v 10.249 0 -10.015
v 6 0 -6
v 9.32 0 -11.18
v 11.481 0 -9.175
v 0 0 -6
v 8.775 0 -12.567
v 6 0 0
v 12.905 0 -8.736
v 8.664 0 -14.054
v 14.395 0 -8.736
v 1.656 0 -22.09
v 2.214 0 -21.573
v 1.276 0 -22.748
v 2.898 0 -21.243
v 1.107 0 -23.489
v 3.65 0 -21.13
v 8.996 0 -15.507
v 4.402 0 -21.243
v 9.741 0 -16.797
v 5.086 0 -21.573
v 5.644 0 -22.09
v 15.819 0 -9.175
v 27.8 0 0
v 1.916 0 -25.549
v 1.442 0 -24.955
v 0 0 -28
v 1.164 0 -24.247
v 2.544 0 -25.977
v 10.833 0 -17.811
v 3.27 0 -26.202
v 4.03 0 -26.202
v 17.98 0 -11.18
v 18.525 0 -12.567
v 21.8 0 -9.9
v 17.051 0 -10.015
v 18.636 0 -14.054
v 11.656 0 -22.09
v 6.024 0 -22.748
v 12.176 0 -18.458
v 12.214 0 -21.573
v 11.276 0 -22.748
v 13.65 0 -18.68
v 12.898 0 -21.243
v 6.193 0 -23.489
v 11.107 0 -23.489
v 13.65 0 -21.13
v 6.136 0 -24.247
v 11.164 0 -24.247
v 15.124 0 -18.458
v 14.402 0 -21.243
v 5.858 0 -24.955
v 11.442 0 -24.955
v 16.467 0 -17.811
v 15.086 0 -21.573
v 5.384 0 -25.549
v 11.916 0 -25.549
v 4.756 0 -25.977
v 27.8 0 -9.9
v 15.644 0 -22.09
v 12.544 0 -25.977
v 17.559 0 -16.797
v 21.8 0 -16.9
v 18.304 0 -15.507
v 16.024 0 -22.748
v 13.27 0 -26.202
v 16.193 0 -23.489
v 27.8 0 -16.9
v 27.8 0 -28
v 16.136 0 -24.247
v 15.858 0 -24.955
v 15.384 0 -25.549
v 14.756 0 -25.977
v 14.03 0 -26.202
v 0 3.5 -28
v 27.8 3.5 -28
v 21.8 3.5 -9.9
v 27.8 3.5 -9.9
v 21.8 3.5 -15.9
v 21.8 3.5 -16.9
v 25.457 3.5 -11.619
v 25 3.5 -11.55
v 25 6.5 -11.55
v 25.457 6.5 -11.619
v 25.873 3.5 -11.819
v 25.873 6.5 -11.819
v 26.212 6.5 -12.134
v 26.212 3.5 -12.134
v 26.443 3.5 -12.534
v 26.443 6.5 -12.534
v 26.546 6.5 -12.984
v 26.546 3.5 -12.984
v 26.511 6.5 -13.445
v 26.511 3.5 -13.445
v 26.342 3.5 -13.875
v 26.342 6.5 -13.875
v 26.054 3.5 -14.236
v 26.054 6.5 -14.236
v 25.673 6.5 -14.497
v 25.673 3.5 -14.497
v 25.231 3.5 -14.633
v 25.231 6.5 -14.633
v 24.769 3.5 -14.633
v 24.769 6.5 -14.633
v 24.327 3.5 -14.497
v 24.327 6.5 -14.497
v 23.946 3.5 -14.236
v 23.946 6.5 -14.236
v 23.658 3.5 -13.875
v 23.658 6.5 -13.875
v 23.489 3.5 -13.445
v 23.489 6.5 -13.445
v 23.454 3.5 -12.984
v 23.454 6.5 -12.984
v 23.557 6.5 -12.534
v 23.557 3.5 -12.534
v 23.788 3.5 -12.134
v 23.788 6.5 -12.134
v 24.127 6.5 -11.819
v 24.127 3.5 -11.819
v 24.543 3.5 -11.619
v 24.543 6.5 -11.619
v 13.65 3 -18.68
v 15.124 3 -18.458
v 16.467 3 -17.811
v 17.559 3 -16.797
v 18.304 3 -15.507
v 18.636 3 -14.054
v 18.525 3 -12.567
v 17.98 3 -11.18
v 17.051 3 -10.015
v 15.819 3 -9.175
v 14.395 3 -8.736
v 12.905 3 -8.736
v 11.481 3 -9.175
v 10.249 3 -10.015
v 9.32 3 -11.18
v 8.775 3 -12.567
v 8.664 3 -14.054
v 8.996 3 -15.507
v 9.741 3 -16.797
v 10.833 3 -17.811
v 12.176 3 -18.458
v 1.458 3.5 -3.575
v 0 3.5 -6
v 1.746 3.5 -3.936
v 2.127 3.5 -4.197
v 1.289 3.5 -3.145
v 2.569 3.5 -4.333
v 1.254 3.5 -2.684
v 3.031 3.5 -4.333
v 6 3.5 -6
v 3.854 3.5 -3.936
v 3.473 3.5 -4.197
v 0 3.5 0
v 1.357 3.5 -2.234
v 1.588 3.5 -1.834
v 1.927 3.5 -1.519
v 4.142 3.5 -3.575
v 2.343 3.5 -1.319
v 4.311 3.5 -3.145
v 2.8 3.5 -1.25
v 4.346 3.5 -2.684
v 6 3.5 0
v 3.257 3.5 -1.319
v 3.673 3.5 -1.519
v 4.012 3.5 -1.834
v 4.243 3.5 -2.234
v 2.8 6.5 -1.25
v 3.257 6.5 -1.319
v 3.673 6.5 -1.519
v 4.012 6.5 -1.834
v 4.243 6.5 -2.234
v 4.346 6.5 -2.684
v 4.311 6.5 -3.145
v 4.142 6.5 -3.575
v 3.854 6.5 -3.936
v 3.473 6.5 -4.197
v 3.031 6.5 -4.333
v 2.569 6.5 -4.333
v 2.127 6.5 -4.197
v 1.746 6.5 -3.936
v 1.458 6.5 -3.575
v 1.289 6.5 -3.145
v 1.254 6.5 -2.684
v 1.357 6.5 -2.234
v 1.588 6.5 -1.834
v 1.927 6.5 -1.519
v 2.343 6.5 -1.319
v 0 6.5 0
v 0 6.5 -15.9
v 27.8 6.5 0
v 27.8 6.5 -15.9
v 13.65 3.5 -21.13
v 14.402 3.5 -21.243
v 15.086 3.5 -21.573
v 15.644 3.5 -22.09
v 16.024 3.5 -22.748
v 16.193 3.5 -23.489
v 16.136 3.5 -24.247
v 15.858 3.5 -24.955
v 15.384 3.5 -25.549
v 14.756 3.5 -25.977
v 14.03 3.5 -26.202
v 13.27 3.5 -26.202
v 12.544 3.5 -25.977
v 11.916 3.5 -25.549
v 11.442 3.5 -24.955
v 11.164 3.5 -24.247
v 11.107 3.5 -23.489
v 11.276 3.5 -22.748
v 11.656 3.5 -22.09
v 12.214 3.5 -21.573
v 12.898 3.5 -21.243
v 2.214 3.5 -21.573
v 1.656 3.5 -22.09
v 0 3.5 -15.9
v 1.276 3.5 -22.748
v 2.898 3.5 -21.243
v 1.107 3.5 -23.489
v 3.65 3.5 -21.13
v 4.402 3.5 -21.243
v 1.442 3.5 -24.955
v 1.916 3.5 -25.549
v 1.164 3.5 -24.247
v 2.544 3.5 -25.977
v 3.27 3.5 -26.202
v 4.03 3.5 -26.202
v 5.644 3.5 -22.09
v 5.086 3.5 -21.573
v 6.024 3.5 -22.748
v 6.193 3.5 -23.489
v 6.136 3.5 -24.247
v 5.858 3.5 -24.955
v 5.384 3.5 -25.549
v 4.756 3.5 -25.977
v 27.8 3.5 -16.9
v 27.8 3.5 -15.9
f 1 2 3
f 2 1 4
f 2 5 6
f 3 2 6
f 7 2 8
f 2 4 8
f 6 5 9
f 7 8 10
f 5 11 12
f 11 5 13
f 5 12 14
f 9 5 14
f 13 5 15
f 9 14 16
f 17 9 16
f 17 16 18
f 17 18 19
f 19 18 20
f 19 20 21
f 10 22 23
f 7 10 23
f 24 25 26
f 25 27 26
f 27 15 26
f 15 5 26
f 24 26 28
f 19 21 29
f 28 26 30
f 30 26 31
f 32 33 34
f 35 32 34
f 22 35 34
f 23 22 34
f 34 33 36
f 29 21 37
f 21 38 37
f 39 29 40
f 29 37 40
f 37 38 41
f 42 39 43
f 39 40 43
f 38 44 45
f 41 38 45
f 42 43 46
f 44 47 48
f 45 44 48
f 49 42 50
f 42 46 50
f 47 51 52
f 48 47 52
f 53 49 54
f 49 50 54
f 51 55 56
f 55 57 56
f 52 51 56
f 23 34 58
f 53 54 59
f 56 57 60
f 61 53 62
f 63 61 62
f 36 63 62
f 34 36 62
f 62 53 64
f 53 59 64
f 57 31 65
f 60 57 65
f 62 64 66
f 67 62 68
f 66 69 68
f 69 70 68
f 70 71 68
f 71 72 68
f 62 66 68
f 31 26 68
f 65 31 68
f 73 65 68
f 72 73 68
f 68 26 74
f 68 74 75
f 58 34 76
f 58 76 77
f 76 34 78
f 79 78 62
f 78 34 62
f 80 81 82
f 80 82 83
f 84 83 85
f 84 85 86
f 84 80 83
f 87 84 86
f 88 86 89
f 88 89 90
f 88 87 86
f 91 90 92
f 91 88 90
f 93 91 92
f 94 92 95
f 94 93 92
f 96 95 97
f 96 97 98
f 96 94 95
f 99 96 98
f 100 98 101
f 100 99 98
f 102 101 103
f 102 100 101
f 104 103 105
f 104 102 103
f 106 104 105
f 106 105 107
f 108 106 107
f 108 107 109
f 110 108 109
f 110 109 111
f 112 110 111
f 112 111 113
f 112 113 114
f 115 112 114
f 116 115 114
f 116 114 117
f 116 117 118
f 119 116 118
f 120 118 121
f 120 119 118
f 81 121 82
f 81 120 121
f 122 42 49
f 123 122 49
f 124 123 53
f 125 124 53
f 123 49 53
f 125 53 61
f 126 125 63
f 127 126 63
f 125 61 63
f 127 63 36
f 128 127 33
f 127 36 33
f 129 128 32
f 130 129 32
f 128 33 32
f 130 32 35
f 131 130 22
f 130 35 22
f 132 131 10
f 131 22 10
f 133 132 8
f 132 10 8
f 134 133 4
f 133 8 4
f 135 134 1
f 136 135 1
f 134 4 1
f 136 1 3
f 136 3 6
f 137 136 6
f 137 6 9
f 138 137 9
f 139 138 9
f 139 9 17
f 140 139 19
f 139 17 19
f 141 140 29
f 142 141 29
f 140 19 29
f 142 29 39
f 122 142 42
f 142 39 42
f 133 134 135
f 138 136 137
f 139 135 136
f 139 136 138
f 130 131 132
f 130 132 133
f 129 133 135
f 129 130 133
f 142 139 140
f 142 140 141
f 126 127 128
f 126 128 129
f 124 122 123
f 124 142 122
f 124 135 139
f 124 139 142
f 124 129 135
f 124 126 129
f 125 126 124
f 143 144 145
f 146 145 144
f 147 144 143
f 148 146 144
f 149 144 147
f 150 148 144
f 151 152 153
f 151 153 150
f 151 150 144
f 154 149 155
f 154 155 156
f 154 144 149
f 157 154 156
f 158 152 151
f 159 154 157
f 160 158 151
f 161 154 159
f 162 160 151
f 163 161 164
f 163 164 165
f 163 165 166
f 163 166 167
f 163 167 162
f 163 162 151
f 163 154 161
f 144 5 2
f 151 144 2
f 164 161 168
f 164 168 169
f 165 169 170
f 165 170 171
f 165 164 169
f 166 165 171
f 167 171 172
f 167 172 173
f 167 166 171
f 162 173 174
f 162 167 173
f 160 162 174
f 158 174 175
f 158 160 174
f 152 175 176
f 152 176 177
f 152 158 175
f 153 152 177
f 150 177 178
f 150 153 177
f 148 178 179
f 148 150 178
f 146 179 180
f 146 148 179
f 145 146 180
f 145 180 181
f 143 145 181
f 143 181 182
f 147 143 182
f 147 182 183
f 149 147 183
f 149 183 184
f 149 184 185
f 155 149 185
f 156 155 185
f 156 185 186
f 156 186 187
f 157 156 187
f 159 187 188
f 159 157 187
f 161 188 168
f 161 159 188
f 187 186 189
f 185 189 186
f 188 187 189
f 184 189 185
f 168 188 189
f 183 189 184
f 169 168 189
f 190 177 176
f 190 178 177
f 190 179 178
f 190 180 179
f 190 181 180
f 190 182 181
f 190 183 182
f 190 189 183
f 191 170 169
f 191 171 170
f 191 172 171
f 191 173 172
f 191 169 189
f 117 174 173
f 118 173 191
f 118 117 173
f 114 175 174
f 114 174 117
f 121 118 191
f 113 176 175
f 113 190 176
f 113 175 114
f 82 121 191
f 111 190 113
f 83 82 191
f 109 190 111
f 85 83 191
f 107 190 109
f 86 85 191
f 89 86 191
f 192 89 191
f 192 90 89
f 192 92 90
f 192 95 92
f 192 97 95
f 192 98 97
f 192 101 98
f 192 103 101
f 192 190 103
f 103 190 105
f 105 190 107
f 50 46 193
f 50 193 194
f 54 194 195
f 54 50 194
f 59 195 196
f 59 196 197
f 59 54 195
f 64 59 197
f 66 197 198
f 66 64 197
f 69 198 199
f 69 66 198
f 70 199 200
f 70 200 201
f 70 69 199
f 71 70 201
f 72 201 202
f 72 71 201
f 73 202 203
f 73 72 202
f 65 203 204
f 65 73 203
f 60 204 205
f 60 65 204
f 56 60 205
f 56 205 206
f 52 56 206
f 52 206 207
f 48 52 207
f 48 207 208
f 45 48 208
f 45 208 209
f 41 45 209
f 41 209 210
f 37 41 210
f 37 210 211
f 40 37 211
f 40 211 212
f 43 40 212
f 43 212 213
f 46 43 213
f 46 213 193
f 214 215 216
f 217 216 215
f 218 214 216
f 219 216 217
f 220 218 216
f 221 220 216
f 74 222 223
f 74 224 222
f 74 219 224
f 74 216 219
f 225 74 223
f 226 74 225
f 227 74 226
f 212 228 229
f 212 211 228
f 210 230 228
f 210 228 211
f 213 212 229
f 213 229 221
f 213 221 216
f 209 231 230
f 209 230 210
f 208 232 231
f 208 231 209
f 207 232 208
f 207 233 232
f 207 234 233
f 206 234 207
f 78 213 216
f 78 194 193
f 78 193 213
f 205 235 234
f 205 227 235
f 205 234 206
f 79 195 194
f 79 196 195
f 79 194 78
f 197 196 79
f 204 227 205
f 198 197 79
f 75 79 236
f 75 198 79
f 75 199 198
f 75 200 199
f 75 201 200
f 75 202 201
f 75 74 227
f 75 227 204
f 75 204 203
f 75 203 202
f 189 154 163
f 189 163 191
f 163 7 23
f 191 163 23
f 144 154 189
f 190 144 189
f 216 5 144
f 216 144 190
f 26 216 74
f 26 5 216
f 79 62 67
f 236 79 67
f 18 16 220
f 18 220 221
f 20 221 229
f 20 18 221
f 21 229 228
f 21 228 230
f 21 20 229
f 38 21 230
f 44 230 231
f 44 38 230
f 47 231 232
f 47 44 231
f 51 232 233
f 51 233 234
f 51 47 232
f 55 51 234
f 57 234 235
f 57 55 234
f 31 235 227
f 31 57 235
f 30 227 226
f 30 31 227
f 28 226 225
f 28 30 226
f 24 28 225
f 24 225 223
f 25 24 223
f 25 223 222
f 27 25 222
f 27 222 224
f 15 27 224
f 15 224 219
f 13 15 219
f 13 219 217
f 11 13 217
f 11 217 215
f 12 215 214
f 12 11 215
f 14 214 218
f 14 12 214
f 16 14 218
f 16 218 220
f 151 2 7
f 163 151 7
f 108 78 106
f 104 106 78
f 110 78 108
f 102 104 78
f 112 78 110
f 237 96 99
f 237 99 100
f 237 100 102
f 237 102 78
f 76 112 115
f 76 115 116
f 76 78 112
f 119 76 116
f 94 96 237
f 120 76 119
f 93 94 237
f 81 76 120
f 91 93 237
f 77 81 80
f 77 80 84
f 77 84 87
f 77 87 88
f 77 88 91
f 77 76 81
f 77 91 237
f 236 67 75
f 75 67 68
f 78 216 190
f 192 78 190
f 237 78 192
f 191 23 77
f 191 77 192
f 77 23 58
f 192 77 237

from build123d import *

# Parameters (mm, degrees)
SKETCH1_W           = 27.8
SKETCH1_H           = 28
SKETCH1_R           = 2.55
BOSS_EXTRUDE1_DEPTH = 3.5
SKETCH2_W           = 27.8
SKETCH2_H           = 15.9
SKETCH2_R           = 1.55
BOSS_EXTRUDE2_DEPTH = 3
SKETCH3_W           = 6
SKETCH3_H           = 6
CUT_EXTRUDE5_DEPTH  = 3.5
SKETCH4_W           = 6
SKETCH4_H           = 6
SKETCH4_H_2         = 1
CUT_EXTRUDE7_DEPTH  = 3.5
SKETCH5_R           = 2.55
SKETCH5_R_2         = 5
CUT_EXTRUDE8_DEPTH  = 3


with BuildPart() as part:
    # Sketch1 → Boss-Extrude1 (new body)
    with BuildSketch(Plane(origin=(0, 0, 0), x_dir=(1, 0, 0), z_dir=(0, 1, 0))):
        with Locations((13.9, 14)):
            Rectangle(SKETCH1_W, SKETCH1_H)
        with Locations(Location((13.65, 23.68, 0), (0, 0, 270))):
            Circle(SKETCH1_R, mode=Mode.SUBTRACT)
        with Locations(Location((3.65, 23.68, 0), (0, 0, 270))):
            Circle(SKETCH1_R, mode=Mode.SUBTRACT)
    extrude(amount=BOSS_EXTRUDE1_DEPTH)

    # Sketch2 → Boss-Extrude2 (add)
    with BuildSketch(Plane(origin=(0, 3.5, 0), x_dir=(1, 0, 0), z_dir=(0, 1, 0))):
        with Locations((13.9, 7.95)):
            Rectangle(SKETCH2_W, SKETCH2_H)
        with Locations(Location((2.8, 2.8, 0), (0, 0, 270))):
            Circle(SKETCH2_R, mode=Mode.SUBTRACT)
        with Locations(Location((25, 13.1, 0), (0, 0, 270))):
            Circle(SKETCH2_R, mode=Mode.SUBTRACT)
    extrude(amount=BOSS_EXTRUDE2_DEPTH)

    # Sketch3 → Cut-Extrude5 (cut)
    with BuildSketch(Plane.XZ):
        with Locations((3, -3)):
            Rectangle(SKETCH3_W, SKETCH3_H)
    extrude(amount=-CUT_EXTRUDE5_DEPTH, mode=Mode.SUBTRACT)

    # Sketch4 → Cut-Extrude7 (cut)
    with BuildSketch(Plane.XZ):
        with Locations((24.8, -12.9)):
            Rectangle(SKETCH4_W, SKETCH4_H)
        with Locations((24.8, -16.4)):
            Rectangle(SKETCH4_W, SKETCH4_H_2)
    extrude(amount=-CUT_EXTRUDE7_DEPTH, mode=Mode.SUBTRACT)

    # Sketch5 → Cut-Extrude8 (cut)
    with BuildSketch(Plane.XZ):
        with Locations(Location((13.65, -23.68, 0), (0, 0, 90))):
            Circle(SKETCH5_R)
        with Locations(Location((13.65, -13.68, 0), (0, 0, 270))):
            Circle(SKETCH5_R_2)
    extrude(amount=-CUT_EXTRUDE8_DEPTH, mode=Mode.SUBTRACT)


solid = part.part
